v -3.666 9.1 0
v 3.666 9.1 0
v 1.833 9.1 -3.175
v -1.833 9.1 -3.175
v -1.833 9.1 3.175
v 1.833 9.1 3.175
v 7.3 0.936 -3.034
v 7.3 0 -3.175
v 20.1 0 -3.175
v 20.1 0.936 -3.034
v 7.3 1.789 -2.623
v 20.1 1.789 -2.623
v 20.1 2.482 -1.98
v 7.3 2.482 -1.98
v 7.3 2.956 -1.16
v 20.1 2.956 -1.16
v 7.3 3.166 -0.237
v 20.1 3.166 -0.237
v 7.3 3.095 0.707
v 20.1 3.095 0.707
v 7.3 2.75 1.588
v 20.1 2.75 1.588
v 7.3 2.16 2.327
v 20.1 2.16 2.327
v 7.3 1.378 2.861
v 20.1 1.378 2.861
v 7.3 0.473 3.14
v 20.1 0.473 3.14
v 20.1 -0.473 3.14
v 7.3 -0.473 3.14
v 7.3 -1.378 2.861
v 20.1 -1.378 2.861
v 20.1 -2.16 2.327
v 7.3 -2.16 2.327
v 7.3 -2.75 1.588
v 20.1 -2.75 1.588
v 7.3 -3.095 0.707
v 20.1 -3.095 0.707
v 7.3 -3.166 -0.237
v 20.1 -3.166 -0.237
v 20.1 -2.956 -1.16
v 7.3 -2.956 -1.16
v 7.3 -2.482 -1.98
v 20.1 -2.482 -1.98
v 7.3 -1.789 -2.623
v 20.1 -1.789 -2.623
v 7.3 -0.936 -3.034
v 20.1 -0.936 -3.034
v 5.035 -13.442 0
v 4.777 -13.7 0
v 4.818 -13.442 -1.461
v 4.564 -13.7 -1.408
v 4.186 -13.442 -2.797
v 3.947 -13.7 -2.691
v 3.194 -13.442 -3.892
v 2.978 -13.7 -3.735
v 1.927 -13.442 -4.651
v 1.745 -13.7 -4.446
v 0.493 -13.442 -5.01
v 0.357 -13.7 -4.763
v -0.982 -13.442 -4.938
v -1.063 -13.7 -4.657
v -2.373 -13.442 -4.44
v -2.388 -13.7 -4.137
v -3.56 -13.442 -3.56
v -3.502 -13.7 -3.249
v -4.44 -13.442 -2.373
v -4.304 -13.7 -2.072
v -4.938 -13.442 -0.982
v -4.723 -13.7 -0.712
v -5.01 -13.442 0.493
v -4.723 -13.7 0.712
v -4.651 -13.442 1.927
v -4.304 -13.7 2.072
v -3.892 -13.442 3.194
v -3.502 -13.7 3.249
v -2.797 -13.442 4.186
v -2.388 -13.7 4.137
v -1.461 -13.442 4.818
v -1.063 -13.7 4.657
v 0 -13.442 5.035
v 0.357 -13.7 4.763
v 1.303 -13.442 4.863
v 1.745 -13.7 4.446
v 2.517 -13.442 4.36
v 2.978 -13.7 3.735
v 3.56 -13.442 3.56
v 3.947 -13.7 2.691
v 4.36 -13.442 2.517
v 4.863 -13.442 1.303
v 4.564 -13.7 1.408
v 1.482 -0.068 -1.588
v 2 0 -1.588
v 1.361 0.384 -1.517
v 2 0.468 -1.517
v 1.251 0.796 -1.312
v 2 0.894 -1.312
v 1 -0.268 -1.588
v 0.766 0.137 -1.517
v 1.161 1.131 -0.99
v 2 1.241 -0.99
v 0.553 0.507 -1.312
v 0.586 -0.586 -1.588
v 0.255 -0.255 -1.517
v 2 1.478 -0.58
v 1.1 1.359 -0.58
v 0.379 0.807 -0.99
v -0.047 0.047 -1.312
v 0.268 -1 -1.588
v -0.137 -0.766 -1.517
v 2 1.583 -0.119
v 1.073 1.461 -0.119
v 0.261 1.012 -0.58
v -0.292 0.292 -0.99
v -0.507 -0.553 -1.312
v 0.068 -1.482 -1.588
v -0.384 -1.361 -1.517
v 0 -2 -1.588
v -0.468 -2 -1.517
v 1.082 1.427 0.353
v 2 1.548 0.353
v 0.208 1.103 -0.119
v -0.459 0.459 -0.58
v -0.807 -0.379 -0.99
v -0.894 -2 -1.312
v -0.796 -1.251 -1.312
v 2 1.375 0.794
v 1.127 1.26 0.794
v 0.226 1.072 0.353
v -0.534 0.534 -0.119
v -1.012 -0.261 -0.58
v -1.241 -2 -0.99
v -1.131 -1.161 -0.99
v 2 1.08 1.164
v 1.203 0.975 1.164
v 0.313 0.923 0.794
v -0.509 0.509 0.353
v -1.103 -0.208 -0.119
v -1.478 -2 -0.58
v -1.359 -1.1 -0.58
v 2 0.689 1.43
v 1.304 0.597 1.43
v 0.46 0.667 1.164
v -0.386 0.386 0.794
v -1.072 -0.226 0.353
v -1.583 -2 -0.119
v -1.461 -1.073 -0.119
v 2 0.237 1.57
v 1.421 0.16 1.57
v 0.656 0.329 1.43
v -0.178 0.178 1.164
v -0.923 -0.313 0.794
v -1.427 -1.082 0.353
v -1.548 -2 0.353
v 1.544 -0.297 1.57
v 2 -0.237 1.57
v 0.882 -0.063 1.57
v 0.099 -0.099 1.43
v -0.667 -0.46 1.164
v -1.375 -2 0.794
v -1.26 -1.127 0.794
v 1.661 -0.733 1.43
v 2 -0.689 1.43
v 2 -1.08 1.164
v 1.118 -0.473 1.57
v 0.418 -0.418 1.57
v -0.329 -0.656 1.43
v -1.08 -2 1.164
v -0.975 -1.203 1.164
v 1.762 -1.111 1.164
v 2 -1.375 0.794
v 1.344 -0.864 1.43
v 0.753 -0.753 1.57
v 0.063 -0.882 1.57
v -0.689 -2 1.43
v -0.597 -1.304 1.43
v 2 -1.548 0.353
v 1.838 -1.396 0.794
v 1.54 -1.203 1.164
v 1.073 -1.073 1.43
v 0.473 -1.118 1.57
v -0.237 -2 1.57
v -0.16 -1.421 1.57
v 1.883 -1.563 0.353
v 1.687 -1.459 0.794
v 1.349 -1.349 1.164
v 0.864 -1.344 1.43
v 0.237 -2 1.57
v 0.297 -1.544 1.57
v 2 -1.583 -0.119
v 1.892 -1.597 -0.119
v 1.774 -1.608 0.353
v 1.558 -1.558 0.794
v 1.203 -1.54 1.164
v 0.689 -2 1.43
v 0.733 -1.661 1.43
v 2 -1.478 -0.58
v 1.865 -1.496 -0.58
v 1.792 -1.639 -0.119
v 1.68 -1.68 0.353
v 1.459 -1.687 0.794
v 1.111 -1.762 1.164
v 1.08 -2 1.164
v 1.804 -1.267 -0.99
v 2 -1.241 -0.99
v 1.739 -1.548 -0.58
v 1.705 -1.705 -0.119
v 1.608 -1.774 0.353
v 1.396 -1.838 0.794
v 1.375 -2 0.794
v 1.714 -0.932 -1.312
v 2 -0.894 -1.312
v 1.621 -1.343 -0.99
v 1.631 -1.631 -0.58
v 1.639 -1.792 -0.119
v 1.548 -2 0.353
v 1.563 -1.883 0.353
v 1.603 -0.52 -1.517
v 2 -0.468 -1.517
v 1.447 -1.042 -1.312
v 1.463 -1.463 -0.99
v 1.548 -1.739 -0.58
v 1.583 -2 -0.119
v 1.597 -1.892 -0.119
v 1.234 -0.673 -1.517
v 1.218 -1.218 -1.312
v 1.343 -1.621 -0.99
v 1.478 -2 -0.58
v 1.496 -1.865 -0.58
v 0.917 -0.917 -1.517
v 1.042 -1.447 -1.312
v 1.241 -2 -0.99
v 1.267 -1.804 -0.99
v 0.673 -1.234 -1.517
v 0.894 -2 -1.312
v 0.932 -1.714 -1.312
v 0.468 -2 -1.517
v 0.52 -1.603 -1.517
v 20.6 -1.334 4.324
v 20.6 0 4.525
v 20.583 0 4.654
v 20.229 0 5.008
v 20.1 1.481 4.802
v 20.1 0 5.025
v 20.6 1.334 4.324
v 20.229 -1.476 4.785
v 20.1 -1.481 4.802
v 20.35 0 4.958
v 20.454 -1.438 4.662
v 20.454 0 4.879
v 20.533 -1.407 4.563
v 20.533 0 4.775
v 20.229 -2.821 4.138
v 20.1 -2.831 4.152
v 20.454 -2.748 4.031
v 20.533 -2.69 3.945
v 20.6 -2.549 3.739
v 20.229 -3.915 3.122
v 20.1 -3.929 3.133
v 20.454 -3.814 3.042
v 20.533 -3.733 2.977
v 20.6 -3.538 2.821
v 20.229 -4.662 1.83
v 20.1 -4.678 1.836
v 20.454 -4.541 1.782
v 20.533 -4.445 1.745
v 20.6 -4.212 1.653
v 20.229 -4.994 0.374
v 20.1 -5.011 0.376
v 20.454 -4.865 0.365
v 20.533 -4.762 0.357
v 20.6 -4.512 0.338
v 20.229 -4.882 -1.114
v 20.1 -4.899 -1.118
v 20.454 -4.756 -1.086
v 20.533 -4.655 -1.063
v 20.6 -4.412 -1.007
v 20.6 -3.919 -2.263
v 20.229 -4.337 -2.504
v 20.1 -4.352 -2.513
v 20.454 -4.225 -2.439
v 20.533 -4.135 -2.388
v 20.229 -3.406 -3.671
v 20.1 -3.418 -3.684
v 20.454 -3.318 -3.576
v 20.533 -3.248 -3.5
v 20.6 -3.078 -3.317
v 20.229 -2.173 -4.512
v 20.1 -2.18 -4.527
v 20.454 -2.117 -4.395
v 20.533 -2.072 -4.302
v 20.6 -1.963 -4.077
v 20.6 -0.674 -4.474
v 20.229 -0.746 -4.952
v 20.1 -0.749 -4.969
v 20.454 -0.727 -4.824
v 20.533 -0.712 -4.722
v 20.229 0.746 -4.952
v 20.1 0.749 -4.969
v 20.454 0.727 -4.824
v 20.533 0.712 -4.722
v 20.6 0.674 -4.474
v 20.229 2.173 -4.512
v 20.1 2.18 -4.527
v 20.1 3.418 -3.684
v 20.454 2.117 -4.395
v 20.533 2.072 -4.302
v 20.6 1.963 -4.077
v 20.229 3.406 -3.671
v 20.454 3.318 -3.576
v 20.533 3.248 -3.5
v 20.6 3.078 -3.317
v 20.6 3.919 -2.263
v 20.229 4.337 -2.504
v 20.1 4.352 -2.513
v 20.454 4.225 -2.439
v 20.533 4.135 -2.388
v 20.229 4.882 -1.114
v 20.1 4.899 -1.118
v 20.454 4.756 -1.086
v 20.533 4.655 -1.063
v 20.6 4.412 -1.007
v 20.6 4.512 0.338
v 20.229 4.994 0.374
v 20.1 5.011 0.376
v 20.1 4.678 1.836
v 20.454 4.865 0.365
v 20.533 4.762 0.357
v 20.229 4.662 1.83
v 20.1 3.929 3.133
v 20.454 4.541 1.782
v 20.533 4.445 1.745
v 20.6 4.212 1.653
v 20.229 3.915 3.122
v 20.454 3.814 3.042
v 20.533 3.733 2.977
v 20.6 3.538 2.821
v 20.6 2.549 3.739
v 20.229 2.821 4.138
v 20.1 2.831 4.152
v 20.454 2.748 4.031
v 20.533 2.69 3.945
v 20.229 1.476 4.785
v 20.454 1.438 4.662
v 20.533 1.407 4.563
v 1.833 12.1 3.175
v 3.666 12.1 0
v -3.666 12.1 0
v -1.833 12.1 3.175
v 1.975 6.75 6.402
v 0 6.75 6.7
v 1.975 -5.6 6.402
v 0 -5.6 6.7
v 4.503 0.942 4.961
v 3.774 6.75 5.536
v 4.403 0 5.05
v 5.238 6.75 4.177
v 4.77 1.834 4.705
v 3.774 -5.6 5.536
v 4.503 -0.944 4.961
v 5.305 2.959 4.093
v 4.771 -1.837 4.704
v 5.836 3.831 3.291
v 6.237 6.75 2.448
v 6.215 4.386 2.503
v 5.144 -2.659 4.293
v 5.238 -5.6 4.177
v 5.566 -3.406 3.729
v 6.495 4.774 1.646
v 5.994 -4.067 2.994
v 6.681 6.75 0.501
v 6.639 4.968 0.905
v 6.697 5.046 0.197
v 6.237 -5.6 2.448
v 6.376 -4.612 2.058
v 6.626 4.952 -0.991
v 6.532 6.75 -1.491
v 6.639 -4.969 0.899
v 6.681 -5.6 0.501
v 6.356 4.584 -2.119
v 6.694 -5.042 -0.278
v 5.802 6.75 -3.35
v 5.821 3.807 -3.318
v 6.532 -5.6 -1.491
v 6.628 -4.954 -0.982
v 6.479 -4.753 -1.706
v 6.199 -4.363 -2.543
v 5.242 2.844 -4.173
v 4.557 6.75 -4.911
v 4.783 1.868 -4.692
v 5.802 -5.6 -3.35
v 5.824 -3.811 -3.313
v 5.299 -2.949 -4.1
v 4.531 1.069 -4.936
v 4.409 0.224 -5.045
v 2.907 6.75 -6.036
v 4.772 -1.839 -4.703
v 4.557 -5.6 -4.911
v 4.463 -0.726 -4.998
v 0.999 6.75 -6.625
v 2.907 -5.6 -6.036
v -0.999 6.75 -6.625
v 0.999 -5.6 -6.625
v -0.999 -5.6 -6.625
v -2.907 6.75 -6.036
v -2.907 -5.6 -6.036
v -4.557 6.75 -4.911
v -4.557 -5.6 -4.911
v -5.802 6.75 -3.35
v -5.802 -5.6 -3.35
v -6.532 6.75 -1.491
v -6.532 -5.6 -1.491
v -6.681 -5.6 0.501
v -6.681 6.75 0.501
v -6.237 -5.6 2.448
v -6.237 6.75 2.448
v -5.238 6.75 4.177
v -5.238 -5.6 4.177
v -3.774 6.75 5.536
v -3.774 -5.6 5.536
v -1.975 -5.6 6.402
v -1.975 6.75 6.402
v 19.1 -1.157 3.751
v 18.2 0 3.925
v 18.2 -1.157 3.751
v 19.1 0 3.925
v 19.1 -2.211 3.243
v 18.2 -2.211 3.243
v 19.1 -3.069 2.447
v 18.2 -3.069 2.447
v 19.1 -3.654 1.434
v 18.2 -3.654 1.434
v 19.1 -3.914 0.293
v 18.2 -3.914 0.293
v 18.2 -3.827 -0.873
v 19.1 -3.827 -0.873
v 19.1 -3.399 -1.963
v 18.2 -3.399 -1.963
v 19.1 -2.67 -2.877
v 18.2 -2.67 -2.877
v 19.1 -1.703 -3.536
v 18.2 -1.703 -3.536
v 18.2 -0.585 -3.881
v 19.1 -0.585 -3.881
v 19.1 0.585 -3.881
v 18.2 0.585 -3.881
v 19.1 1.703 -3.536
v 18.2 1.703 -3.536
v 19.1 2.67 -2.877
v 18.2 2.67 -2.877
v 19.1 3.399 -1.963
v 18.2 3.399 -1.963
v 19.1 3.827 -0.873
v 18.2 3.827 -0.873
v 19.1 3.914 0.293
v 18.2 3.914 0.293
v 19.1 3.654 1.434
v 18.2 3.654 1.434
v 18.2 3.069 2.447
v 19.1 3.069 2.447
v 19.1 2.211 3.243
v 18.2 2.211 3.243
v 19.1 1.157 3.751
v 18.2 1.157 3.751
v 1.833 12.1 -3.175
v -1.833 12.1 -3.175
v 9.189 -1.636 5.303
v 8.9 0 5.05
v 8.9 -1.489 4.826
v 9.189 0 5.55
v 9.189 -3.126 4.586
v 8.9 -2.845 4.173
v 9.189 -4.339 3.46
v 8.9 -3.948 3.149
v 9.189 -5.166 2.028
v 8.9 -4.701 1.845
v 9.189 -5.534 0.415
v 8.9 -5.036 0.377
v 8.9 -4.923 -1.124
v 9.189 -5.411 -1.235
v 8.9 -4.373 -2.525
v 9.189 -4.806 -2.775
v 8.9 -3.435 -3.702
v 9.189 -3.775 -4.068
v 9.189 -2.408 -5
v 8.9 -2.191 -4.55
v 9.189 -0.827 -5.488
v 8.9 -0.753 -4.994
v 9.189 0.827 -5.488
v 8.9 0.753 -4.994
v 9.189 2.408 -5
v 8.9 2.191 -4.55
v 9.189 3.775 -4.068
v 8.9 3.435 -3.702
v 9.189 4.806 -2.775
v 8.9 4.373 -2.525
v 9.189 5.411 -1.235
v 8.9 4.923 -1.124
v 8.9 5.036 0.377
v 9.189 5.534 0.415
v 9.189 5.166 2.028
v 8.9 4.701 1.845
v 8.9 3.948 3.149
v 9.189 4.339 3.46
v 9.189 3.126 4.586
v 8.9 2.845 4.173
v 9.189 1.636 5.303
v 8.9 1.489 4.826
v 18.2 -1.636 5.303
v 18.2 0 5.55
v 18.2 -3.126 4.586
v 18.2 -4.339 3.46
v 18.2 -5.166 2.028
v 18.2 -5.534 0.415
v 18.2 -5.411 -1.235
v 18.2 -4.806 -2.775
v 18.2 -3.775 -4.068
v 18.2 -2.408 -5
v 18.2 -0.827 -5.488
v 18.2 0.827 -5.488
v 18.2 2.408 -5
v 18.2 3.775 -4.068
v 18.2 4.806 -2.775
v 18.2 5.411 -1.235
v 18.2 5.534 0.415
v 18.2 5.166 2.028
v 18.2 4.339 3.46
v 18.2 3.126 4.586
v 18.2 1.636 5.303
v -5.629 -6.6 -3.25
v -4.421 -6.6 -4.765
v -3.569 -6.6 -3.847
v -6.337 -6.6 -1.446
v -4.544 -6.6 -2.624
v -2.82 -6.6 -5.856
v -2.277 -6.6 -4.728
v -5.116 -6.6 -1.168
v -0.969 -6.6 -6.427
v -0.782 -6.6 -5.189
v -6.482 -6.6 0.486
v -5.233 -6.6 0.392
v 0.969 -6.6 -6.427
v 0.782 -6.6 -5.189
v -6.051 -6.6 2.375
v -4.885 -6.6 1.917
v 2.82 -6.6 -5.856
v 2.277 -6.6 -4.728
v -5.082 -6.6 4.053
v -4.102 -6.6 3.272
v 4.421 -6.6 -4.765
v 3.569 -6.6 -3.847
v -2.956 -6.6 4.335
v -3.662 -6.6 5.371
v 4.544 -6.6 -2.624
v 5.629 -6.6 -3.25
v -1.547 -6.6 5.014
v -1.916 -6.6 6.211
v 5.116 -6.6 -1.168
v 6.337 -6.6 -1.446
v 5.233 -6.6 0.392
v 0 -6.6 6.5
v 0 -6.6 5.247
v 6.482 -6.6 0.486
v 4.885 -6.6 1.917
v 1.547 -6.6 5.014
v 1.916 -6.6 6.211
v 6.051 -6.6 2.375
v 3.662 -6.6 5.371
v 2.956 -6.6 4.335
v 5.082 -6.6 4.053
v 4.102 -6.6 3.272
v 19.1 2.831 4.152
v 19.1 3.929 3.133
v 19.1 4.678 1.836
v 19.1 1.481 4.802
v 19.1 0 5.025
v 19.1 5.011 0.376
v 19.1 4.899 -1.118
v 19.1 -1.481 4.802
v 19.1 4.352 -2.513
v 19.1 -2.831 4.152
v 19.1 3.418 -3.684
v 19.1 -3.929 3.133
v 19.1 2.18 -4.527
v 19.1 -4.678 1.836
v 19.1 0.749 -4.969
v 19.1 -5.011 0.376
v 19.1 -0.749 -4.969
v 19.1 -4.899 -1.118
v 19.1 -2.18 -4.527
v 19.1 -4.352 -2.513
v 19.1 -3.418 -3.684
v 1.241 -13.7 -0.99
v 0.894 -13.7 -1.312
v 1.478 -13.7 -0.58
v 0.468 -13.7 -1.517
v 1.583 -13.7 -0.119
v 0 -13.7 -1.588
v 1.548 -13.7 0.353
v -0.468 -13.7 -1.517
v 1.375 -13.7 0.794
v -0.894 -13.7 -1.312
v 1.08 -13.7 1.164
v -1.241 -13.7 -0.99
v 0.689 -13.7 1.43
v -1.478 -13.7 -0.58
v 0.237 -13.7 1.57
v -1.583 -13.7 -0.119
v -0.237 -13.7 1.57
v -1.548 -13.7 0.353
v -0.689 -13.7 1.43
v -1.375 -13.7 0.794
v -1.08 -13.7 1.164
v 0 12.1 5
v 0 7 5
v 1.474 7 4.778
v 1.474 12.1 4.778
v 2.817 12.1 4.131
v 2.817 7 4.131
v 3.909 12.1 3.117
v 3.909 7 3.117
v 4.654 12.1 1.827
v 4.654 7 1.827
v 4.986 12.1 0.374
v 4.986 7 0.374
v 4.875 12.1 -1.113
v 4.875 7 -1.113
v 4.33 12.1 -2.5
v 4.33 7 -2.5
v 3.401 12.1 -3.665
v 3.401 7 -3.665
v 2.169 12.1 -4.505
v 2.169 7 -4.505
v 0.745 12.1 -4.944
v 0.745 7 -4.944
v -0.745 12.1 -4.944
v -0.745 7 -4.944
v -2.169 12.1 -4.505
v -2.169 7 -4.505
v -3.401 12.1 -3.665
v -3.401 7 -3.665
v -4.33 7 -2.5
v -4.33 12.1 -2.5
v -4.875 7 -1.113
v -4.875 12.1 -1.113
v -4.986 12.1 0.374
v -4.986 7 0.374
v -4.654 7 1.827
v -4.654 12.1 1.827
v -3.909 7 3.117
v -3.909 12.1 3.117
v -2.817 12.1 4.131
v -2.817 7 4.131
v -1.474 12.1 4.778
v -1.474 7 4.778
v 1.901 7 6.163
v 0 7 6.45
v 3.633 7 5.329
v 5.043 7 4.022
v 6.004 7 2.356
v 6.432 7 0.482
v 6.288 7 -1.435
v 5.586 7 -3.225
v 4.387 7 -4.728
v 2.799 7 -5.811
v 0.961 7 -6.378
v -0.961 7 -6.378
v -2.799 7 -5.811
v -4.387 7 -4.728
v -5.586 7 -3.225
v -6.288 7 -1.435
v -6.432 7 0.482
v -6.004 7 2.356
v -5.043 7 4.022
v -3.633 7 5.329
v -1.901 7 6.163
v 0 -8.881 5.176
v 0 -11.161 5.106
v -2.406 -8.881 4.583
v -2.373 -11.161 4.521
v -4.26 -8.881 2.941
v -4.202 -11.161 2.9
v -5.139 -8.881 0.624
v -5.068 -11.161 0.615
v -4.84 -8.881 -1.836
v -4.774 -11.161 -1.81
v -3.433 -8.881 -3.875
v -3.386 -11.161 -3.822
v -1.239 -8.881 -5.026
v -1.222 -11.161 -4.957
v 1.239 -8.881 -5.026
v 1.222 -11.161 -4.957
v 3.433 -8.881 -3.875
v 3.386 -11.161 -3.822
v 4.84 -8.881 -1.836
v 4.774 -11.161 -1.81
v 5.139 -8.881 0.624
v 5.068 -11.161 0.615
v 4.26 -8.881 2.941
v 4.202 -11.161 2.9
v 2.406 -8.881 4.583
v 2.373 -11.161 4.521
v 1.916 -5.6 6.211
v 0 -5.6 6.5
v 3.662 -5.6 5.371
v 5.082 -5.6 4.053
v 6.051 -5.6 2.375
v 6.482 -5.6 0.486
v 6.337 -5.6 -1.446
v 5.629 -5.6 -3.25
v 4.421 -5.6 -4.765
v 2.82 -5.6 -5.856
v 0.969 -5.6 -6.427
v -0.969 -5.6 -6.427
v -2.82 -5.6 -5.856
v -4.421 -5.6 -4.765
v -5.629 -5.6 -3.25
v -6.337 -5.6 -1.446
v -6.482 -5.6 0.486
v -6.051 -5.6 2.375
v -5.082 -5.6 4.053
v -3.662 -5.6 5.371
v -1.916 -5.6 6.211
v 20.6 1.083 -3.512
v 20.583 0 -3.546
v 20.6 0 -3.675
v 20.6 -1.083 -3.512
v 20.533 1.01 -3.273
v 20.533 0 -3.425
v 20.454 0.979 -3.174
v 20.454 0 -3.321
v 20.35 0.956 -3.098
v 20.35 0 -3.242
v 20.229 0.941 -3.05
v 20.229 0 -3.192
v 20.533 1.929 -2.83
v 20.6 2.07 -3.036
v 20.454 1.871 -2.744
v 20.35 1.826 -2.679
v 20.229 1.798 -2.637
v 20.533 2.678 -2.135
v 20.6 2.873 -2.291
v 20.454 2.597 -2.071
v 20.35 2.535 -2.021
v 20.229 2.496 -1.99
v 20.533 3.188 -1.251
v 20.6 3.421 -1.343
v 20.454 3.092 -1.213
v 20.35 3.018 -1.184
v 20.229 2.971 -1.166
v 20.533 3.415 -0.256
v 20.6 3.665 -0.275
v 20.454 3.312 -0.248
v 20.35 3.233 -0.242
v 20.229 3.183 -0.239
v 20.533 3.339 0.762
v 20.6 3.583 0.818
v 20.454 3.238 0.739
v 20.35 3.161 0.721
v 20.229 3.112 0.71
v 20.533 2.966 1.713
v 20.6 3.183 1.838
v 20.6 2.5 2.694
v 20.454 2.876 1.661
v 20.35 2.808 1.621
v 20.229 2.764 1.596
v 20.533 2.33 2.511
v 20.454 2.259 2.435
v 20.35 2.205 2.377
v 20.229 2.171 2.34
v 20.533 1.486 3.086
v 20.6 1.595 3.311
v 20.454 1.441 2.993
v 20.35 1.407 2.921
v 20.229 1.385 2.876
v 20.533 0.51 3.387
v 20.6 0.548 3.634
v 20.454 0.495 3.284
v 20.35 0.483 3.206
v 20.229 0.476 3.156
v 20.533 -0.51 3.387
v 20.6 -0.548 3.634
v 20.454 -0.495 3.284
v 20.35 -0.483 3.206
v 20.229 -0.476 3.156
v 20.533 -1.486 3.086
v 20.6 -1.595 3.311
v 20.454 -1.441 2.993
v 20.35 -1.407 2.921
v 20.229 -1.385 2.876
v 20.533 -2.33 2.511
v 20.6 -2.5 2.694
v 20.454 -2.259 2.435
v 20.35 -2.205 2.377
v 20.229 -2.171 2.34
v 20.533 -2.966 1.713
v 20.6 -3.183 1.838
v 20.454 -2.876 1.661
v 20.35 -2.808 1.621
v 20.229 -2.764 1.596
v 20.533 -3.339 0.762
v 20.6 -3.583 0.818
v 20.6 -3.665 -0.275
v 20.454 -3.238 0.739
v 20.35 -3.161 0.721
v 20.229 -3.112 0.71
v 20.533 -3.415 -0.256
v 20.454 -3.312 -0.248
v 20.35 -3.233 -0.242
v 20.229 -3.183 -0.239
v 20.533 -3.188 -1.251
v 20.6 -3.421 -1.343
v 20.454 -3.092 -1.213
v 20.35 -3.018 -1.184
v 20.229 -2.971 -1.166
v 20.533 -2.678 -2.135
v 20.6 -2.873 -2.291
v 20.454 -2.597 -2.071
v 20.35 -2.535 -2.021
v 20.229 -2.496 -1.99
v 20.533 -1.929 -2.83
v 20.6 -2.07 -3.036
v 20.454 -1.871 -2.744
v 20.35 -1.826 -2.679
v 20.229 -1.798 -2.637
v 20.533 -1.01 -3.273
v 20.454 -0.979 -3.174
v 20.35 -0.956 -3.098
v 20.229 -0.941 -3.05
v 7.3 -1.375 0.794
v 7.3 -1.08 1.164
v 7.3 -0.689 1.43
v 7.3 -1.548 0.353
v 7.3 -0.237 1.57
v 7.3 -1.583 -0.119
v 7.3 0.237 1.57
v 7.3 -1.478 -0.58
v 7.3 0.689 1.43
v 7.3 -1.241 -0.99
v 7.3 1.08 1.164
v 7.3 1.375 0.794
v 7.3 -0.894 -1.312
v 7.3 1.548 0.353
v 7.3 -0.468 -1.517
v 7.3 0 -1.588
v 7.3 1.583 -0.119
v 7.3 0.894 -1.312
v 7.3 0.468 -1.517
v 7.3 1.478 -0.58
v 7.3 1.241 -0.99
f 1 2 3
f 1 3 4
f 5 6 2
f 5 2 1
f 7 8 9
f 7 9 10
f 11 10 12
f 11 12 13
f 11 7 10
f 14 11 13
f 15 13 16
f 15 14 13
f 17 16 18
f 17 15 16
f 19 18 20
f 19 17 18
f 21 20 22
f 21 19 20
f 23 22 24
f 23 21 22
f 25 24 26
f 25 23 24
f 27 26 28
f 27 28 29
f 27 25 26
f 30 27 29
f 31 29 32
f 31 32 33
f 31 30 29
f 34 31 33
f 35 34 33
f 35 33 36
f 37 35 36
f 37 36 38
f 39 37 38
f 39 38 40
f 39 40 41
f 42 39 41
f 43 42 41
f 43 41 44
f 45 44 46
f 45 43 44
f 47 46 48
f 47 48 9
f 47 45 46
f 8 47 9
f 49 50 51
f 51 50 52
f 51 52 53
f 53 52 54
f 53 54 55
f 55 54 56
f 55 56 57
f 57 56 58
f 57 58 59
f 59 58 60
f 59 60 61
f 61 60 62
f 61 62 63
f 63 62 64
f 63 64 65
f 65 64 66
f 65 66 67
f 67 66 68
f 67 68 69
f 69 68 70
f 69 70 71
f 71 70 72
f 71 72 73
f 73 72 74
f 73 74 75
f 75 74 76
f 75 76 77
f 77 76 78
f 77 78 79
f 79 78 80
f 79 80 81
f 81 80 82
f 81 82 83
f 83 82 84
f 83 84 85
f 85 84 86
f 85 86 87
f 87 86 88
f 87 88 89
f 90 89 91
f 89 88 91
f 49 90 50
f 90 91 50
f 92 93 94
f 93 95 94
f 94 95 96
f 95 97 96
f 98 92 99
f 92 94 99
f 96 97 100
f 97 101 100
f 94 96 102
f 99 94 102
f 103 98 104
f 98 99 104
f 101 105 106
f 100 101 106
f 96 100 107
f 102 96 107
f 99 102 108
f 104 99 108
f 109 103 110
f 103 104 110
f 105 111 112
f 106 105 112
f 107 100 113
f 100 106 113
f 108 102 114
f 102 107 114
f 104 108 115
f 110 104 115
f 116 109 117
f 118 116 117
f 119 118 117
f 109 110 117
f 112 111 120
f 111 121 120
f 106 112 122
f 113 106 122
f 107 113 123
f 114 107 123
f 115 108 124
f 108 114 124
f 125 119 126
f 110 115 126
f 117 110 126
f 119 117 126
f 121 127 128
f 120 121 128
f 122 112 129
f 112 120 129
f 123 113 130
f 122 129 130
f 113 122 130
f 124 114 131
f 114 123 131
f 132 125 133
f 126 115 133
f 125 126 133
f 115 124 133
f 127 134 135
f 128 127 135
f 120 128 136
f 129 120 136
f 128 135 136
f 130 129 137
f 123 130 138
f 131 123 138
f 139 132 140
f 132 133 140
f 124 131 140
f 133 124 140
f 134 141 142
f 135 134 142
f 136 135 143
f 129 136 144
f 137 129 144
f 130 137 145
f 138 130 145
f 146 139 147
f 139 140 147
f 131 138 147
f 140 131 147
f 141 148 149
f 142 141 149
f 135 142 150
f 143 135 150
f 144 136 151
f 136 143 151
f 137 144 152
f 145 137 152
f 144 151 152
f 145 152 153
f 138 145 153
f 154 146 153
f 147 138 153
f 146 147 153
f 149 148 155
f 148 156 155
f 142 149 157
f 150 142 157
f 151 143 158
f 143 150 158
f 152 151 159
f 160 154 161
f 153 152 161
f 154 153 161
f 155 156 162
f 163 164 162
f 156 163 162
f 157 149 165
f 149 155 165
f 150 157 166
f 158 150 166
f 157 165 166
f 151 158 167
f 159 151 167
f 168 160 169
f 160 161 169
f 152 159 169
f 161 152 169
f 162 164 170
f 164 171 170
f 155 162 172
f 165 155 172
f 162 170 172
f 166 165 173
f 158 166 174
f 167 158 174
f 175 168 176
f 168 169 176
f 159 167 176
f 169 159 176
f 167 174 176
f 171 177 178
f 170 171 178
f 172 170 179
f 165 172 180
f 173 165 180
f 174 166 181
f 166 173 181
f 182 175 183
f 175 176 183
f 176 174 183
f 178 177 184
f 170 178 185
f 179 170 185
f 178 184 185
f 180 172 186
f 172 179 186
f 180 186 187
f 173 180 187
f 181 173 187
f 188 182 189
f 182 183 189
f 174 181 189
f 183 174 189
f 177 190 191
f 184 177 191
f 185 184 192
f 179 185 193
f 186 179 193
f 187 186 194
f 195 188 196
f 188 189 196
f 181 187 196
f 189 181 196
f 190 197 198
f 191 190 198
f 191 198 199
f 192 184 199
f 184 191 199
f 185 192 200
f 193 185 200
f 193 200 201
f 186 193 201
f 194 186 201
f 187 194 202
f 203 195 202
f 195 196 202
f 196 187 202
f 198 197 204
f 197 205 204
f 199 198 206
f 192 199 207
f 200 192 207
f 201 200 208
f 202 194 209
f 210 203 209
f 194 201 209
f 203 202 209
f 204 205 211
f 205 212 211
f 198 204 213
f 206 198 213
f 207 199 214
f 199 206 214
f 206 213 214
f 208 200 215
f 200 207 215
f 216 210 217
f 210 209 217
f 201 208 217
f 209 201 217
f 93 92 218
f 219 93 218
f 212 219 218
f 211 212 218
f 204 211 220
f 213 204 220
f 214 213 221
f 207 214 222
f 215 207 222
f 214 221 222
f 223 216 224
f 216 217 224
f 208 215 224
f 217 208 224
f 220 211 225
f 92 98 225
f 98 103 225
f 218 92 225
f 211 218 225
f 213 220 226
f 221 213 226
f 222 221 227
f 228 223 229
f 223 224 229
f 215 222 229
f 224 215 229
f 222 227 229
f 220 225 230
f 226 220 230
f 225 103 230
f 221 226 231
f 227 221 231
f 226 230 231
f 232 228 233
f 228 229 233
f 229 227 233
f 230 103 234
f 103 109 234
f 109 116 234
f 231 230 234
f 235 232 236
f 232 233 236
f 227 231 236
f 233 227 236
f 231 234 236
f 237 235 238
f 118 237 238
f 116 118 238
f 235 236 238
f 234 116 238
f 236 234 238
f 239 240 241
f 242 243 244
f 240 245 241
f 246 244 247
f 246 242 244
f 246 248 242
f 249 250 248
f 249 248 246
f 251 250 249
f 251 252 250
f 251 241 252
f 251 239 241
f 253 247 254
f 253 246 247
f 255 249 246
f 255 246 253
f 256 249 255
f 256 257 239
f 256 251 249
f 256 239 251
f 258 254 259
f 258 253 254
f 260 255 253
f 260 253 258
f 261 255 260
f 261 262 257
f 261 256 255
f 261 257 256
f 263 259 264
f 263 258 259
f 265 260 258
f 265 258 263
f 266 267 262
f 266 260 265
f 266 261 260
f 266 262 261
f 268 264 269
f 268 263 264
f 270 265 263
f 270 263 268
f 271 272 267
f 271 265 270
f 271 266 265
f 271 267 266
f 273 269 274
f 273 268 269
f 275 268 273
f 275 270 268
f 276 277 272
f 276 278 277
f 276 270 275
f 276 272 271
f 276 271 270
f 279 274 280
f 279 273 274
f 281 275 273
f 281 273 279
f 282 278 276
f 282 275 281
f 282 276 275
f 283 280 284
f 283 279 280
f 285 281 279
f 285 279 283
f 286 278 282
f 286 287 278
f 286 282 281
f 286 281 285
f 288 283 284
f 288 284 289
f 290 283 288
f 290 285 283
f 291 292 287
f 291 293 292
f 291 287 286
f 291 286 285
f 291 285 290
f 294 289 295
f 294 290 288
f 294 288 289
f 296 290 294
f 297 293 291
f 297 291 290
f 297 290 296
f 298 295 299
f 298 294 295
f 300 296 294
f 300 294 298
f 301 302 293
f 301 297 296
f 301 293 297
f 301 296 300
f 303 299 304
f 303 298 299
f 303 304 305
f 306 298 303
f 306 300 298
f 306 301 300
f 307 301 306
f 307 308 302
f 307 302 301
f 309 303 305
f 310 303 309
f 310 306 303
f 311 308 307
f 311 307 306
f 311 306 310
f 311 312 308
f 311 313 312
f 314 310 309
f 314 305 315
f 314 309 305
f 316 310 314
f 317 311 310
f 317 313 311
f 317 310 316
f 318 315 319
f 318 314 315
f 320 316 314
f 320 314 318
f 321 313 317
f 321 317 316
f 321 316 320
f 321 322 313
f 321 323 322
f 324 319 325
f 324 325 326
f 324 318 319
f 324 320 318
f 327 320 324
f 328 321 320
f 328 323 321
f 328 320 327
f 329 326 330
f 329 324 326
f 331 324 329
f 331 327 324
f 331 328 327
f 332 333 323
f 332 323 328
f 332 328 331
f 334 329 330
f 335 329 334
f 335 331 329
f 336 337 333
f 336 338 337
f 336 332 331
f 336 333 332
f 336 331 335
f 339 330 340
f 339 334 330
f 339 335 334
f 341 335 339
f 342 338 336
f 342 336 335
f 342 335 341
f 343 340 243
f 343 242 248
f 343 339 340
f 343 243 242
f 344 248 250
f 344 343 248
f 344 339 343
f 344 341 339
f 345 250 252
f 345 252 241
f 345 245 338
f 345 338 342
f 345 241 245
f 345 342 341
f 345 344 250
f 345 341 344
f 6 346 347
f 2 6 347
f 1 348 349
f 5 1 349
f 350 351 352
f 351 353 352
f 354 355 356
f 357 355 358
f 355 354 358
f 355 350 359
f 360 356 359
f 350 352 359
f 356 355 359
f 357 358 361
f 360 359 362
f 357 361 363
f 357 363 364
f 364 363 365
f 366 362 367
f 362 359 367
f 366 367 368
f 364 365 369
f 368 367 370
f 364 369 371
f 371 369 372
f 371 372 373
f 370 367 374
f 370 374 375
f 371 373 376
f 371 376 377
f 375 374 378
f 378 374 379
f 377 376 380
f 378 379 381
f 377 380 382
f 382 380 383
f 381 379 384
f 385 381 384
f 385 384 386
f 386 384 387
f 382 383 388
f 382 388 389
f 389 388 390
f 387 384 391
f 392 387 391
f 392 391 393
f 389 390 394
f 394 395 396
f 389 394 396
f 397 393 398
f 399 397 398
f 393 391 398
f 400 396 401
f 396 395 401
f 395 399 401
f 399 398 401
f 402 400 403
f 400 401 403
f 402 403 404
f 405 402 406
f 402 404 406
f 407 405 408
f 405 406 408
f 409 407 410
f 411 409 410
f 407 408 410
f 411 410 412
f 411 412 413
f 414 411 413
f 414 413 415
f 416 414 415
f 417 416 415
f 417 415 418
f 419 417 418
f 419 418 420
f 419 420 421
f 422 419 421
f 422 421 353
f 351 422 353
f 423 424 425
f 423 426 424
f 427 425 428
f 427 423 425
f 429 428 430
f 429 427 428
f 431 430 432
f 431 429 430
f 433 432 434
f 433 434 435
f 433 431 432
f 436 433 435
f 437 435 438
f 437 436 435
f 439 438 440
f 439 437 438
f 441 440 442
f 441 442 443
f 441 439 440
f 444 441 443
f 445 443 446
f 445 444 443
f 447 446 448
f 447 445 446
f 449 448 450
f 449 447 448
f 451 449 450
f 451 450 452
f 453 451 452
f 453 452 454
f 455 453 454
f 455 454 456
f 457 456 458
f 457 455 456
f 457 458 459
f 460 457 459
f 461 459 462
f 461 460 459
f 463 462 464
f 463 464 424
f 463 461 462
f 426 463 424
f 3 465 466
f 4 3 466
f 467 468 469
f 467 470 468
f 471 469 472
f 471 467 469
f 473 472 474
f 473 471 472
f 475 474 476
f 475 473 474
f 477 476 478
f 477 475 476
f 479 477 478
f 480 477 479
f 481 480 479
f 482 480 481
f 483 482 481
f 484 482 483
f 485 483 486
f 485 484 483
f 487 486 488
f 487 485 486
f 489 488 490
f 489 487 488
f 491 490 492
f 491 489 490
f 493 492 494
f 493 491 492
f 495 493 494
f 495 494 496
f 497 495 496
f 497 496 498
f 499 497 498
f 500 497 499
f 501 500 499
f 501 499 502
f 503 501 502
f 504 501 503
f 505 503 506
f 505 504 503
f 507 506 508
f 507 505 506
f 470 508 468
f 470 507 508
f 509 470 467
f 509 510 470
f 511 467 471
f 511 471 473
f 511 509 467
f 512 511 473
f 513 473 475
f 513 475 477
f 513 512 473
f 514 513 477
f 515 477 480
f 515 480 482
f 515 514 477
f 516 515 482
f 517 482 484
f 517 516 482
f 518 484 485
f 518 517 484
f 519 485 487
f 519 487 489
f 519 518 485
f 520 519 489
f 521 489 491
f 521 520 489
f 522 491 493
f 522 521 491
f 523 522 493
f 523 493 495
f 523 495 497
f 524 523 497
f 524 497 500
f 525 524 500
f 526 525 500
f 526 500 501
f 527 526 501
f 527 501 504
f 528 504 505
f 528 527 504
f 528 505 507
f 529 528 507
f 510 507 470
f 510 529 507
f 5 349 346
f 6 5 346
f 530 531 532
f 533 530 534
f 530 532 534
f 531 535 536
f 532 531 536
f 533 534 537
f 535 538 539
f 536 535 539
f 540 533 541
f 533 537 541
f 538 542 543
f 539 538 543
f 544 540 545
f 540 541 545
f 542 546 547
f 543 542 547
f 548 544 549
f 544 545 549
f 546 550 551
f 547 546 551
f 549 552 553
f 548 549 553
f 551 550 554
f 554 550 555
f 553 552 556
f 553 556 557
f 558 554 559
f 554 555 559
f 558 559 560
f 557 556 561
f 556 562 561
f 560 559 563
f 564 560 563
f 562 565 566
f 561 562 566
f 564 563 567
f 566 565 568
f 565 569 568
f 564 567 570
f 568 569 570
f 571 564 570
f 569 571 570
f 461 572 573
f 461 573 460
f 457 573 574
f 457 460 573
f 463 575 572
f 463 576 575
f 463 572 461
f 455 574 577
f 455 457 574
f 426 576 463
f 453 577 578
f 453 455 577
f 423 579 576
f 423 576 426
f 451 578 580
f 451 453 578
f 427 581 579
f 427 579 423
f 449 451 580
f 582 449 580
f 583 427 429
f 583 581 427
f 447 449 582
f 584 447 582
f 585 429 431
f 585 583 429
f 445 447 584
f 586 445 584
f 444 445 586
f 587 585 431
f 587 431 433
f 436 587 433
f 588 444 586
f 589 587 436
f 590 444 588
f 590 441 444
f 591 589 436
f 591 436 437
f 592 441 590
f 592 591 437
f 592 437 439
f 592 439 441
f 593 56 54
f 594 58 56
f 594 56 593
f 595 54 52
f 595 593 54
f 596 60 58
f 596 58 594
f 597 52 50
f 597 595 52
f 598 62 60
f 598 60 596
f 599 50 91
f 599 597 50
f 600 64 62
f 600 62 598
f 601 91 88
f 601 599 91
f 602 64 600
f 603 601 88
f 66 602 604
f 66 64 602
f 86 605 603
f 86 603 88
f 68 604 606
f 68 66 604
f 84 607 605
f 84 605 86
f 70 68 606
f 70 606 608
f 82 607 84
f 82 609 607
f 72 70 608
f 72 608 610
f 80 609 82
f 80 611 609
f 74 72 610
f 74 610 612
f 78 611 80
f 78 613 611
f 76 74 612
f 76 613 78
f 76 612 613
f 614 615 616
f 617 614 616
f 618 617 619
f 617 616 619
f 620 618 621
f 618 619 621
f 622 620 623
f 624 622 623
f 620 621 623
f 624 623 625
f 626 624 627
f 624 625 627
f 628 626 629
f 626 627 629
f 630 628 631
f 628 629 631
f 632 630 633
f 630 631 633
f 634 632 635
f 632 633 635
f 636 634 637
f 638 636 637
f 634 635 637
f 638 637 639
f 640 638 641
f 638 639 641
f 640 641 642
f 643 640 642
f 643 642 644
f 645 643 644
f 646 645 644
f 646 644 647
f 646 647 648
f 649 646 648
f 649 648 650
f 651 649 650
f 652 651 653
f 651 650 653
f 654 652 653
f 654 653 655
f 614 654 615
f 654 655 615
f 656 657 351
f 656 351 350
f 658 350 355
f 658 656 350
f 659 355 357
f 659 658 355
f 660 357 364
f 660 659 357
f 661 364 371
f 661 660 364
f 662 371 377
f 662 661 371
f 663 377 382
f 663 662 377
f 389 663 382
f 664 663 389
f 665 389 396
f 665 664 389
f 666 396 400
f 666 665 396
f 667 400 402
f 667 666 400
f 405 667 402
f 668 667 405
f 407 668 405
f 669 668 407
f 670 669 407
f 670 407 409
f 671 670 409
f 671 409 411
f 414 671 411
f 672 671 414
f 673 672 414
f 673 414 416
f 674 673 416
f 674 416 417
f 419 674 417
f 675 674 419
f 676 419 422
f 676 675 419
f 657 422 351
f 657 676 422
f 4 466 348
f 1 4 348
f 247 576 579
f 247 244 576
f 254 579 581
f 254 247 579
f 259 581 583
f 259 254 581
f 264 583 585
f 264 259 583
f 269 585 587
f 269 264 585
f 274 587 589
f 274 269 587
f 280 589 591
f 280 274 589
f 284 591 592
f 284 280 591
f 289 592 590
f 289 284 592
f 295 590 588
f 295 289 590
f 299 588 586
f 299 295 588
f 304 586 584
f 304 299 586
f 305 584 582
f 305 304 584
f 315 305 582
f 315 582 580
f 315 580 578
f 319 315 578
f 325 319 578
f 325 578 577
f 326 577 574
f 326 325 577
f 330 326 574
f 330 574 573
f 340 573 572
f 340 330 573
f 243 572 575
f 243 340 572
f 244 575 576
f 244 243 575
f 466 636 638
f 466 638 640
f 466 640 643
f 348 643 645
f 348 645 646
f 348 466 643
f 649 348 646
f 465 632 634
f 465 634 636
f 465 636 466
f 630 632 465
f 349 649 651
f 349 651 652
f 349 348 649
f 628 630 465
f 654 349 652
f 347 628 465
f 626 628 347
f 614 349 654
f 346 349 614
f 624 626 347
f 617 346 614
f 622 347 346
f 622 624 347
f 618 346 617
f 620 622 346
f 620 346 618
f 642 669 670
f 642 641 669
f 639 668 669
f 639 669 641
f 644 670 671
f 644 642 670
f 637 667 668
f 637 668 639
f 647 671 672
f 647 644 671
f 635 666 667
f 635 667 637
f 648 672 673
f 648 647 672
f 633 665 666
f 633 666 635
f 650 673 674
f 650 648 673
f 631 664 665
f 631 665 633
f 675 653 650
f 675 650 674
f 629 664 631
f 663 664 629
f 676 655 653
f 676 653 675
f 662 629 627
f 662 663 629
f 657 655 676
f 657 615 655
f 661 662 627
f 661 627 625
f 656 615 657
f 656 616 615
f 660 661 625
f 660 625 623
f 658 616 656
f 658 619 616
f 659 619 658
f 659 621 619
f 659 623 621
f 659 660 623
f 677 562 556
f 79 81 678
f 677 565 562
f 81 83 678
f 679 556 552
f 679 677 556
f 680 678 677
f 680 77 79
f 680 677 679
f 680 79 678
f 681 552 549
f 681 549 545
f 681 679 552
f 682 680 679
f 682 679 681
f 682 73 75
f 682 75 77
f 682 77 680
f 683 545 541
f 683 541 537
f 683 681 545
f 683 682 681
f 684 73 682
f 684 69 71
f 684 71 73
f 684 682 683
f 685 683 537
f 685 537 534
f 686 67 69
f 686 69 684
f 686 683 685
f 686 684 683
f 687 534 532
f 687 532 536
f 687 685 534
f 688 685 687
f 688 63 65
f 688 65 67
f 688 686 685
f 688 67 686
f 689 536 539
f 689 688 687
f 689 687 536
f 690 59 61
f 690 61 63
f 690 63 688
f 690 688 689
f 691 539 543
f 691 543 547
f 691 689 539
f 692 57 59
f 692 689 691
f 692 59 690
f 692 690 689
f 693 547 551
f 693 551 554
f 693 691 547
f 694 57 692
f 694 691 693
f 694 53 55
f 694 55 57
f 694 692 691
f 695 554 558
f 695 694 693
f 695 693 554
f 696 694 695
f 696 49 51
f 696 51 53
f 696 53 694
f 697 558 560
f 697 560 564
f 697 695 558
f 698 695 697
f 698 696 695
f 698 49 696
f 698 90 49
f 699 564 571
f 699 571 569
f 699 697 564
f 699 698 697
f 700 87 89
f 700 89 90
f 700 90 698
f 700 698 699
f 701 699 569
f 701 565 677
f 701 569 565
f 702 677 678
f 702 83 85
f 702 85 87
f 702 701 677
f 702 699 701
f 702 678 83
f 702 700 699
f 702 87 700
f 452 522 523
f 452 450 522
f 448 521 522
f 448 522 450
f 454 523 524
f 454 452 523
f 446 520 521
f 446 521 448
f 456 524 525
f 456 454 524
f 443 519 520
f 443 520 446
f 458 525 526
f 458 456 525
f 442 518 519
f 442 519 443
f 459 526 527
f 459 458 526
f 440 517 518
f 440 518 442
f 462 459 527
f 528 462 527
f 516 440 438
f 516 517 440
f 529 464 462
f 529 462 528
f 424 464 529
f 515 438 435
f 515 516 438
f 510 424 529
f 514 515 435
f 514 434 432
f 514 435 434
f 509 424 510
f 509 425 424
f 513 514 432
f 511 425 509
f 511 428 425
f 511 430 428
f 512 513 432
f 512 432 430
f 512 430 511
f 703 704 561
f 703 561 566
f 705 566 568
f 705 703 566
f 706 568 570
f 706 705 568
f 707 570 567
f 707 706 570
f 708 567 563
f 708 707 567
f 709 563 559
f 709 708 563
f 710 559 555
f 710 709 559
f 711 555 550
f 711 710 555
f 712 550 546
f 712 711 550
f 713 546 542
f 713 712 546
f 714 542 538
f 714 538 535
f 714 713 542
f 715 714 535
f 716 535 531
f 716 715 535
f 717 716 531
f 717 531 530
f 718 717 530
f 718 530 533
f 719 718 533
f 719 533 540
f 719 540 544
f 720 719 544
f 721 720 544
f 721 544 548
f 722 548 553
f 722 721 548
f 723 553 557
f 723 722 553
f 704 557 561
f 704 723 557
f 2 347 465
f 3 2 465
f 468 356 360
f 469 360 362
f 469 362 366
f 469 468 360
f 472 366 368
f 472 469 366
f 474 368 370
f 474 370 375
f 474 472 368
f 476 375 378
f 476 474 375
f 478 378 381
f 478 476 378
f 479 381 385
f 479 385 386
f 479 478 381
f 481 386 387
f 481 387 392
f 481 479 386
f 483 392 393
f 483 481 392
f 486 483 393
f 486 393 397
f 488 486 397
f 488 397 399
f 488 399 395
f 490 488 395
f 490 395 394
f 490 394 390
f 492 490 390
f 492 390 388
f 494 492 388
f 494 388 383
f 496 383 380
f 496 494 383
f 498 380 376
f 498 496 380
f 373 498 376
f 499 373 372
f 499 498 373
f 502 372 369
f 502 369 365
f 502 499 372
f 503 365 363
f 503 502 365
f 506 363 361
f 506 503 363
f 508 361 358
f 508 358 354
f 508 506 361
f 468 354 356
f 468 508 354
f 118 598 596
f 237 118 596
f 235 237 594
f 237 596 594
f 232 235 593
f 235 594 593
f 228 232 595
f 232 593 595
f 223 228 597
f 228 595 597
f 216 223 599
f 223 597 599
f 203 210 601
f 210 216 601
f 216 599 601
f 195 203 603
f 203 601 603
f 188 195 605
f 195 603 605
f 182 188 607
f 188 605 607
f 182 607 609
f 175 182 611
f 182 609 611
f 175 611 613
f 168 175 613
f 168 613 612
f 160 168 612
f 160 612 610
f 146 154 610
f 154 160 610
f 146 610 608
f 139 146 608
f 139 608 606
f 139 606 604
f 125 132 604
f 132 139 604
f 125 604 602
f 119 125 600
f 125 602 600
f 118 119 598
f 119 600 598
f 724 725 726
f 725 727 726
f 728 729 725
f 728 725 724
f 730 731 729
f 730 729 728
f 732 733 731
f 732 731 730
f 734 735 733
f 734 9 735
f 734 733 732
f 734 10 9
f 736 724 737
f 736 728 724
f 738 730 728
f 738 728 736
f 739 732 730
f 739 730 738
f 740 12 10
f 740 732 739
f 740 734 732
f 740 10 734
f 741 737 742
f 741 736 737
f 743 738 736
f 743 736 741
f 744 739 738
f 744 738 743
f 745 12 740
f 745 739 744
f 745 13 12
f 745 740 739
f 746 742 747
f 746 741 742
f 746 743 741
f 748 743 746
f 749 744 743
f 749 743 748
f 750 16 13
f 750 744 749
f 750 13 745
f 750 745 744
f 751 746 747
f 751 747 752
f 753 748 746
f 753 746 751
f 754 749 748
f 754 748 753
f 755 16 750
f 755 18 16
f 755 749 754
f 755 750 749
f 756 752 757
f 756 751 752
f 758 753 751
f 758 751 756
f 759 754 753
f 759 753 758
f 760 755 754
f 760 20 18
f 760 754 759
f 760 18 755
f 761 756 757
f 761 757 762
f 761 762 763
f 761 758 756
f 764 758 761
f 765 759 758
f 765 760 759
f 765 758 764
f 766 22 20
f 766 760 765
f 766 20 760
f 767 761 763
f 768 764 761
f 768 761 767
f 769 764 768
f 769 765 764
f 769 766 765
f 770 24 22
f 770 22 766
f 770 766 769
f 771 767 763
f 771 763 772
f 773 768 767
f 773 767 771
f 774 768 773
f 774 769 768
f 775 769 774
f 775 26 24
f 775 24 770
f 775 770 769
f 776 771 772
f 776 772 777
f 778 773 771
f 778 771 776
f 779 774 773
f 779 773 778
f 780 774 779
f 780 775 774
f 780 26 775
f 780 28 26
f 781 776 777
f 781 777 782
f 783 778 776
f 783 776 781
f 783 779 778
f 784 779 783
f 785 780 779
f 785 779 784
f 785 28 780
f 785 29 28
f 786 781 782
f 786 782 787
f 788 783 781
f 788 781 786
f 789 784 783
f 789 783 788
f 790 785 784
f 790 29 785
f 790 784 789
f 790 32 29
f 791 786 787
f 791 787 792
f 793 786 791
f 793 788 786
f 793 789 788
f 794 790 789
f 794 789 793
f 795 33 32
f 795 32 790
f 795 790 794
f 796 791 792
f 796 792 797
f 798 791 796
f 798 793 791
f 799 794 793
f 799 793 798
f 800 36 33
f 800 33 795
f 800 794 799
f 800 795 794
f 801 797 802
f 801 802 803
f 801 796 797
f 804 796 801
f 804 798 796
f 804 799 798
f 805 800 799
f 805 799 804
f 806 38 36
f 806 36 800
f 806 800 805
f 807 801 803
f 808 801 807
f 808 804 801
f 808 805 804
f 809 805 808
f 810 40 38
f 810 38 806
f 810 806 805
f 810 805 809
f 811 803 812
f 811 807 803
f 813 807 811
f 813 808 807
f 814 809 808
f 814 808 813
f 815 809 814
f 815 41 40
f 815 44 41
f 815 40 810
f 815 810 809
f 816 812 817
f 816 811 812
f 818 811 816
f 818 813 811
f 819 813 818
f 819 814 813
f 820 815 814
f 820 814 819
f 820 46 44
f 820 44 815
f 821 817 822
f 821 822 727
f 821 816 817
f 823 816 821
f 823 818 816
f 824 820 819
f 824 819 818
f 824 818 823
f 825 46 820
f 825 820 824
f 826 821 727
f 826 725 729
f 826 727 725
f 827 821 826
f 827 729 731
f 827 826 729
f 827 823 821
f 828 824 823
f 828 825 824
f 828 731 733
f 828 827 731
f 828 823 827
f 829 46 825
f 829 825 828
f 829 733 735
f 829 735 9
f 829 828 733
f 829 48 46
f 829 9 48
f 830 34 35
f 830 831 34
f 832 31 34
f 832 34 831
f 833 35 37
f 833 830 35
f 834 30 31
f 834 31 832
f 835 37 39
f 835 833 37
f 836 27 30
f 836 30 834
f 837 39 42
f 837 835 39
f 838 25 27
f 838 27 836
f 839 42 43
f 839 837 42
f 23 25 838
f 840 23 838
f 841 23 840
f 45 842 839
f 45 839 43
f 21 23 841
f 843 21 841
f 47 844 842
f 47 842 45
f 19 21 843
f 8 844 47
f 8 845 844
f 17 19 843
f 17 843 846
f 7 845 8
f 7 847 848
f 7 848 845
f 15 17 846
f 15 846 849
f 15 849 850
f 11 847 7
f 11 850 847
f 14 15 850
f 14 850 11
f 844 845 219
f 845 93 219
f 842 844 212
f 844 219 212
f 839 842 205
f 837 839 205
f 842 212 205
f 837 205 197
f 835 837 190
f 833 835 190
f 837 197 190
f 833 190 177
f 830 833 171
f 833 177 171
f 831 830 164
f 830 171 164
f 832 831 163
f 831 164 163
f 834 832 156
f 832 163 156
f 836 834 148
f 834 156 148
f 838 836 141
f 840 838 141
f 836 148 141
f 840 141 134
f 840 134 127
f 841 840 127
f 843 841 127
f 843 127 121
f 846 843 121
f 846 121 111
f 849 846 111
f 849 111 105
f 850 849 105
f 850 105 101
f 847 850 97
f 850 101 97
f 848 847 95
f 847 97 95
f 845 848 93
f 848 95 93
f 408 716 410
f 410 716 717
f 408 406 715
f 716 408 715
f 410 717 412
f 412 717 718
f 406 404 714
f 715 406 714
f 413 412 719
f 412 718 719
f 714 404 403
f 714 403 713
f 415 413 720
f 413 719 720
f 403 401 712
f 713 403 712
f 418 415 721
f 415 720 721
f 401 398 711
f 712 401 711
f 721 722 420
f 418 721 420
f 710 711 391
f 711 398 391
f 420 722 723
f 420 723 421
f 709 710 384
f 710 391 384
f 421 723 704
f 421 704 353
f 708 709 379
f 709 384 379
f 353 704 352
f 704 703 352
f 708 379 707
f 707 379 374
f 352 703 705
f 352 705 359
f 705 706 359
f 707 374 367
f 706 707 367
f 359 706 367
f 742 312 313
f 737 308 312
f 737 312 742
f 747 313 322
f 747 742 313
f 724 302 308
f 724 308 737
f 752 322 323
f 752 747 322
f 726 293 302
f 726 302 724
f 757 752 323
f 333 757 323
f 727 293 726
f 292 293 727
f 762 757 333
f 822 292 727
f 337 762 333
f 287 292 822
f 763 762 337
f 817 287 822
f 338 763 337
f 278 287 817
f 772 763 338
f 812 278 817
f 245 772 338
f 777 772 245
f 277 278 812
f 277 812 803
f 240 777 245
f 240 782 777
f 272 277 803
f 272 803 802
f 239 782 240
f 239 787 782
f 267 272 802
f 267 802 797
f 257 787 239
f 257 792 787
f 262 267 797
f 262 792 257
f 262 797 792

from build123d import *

# Parameters (mm, degrees)
CBODY_DEPTH            = 7
CBODY_DEPTH_BACK       = 5.6
CBODY_SKETCH_R         = 6.7
CBODY_CHAMFER_SIZE     = 0.25
THREAD_OFFSET_SKETCH_R = 6.5
THREAD_OFFSET_DEPTH    = 1
HEAD_SKETCH_R          = 5
HEAD_DEPTH             = 5.1
HEX_2_DEPTH            = 3
TUBE_START             = -13.3
TUBE_SKETCH_R          = 3.175
TUBE_DEPTH             = 13.3
TUBE_FILLET_R          = 0.5
PROFILE_PORT_R         = 1.5875


with BuildPart() as part:
    # CBody_Sketch → CBody (new, two sides: drawn at the far end of the back side and taken through both)
    with BuildSketch(Plane(origin=(0, 0, 0), x_dir=(1, 0, 0), z_dir=(0, 1, 0)).offset(-CBODY_DEPTH_BACK)):
        with Locations(Location((0, 0, 0), (0, 0, 270))):
            Circle(CBODY_SKETCH_R)
    extrude(amount=CBODY_DEPTH + CBODY_DEPTH_BACK)

    # CBody_Chamfer
    cbody_chamfer_edges = [part.edges().sort_by_distance(p)[0] for p in [
        (0, 7, -6.7),
    ]]
    chamfer(cbody_chamfer_edges, length=CBODY_CHAMFER_SIZE)

    # Thread_Offset_Sketch → Thread_Offset (add)
    with BuildSketch(Plane(origin=(0, -5.6, 0), x_dir=(-1, 0, 0), z_dir=(0, 1, 0))):
        with Locations(Location((0, 0, 0), (0, 0, 90))):
            Circle(THREAD_OFFSET_SKETCH_R)
    extrude(amount=-THREAD_OFFSET_DEPTH)

    # Thread_Sketch → Thread (revolve)
    with BuildSketch(Plane.XY, mode=Mode.PRIVATE) as thread_sk:
        Polygon((-5.24727057, -6.6), (-5.026624869, -13.7), (0, -13.7), (0, -6.6), align=None)
    revolve(thread_sk.sketch.rotate(Axis((0, 0, 0), (0, -1, 0)), 270), axis=Axis((0, 0, 0), (0, -1, 0)))

    # Thread_Chamfer: read off the stored shape, not the designer's step
    # Thread_Chamfer outline → Thread_Chamfer (revolve, cut)
    with BuildSketch(Plane.XY):
        Polygon((5.03464327, -13.441981598), (4.776624869, -13.7), (5.03464327, -13.7), align=None)
    revolve(axis=Axis((0, 0, 0), (0, 1, 0)), mode=Mode.SUBTRACT)

    # Head_Sketch → Head (add)
    with BuildSketch(Plane(origin=(0, 7, 0), x_dir=(-1, 0, 0), z_dir=(0, 1, 0))):
        with Locations(Location((0, 0, 0), (0, 0, 90))):
            Circle(HEAD_SKETCH_R)
    extrude(amount=HEAD_DEPTH)

    # Hex_Sketch → Hex 2 (cut)
    with BuildSketch(Plane(origin=(0, 12.1, 0), x_dir=(-1, 0, 0), z_dir=(0, 1, 0))):
        Polygon((-1.833087105, 3.175), (-3.666174209, 0), (-1.833087105, -3.175), (1.833087105, -3.175), (3.666174209, 0), (1.833087105, 3.175), align=None)
    extrude(amount=-HEX_2_DEPTH, mode=Mode.SUBTRACT)

    # RBody_Sketch → RBody (revolve)
    with BuildSketch(Plane(origin=(0, 0, 0), x_dir=(1, 0, 0), z_dir=(0, 1, 0))):
        Polygon((0, 0), (2.915618859, -5.05), (8.9, -5.05), (9.188675135, -5.55), (18.2, -5.55), (18.2, 0), align=None)
    revolve(axis=Axis((-16.33553342, 0, 0), (1, 0, 0)))

    # Release_Sketch → Release (revolve)
    with BuildSketch(Plane(origin=(0, 0, 0), x_dir=(1, 0, 0), z_dir=(0, 1, 0)), mode=Mode.PRIVATE) as release_sk:
        with BuildLine():
            Line((18.2, 0), (18.2, 3.925))
            Line((18.2, 3.925), (19.1, 3.925))
            Line((19.1, 3.925), (19.1, 5.025))
            Line((19.1, 5.025), (20.1, 5.025))
            ThreePointArc((20.1, 5.025), (20.453553391, 4.878553391), (20.6, 4.525))
            Line((20.6, 4.525), (20.6, 0))
            Line((20.6, 0), (18.2, 0))
        make_face()
    revolve(release_sk.sketch.rotate(Axis((0, 0, 0), (1, 0, 0)), 180), axis=Axis((0, 0, 0), (1, 0, 0)))

    # Tube_Sketch → Tube (cut)
    with BuildSketch(Plane(origin=(20.6, 0, 0), x_dir=(0, 0, -1), z_dir=(1, 0, 0)).offset(TUBE_START)):
        Circle(TUBE_SKETCH_R)
    extrude(amount=TUBE_DEPTH, mode=Mode.SUBTRACT)

    # Tube_Fillet
    tube_fillet_edges = [part.edges().sort_by_distance(p)[0] for p in [
        (20.6, 0, 3.175),
    ]]
    fillet(tube_fillet_edges, radius=TUBE_FILLET_R)

    # Port: sweep along a path in Path Port
    with BuildLine(Plane.XY) as port_path:
        Line((20.6, 0), (2, 0))
        ThreePointArc((2, 0), (0.585786438, -0.585786438), (0, -2))
        Line((0, -2), (0, -13.7))
    # Profile Port → Port (sweep, cut)
    with BuildSketch(Plane(origin=(20.6, 0, 0), x_dir=(0, 0, -1), z_dir=(1, 0, 0))):
        Circle(PROFILE_PORT_R)
    sweep(path=port_path.line, mode=Mode.SUBTRACT)


solid = part.part
